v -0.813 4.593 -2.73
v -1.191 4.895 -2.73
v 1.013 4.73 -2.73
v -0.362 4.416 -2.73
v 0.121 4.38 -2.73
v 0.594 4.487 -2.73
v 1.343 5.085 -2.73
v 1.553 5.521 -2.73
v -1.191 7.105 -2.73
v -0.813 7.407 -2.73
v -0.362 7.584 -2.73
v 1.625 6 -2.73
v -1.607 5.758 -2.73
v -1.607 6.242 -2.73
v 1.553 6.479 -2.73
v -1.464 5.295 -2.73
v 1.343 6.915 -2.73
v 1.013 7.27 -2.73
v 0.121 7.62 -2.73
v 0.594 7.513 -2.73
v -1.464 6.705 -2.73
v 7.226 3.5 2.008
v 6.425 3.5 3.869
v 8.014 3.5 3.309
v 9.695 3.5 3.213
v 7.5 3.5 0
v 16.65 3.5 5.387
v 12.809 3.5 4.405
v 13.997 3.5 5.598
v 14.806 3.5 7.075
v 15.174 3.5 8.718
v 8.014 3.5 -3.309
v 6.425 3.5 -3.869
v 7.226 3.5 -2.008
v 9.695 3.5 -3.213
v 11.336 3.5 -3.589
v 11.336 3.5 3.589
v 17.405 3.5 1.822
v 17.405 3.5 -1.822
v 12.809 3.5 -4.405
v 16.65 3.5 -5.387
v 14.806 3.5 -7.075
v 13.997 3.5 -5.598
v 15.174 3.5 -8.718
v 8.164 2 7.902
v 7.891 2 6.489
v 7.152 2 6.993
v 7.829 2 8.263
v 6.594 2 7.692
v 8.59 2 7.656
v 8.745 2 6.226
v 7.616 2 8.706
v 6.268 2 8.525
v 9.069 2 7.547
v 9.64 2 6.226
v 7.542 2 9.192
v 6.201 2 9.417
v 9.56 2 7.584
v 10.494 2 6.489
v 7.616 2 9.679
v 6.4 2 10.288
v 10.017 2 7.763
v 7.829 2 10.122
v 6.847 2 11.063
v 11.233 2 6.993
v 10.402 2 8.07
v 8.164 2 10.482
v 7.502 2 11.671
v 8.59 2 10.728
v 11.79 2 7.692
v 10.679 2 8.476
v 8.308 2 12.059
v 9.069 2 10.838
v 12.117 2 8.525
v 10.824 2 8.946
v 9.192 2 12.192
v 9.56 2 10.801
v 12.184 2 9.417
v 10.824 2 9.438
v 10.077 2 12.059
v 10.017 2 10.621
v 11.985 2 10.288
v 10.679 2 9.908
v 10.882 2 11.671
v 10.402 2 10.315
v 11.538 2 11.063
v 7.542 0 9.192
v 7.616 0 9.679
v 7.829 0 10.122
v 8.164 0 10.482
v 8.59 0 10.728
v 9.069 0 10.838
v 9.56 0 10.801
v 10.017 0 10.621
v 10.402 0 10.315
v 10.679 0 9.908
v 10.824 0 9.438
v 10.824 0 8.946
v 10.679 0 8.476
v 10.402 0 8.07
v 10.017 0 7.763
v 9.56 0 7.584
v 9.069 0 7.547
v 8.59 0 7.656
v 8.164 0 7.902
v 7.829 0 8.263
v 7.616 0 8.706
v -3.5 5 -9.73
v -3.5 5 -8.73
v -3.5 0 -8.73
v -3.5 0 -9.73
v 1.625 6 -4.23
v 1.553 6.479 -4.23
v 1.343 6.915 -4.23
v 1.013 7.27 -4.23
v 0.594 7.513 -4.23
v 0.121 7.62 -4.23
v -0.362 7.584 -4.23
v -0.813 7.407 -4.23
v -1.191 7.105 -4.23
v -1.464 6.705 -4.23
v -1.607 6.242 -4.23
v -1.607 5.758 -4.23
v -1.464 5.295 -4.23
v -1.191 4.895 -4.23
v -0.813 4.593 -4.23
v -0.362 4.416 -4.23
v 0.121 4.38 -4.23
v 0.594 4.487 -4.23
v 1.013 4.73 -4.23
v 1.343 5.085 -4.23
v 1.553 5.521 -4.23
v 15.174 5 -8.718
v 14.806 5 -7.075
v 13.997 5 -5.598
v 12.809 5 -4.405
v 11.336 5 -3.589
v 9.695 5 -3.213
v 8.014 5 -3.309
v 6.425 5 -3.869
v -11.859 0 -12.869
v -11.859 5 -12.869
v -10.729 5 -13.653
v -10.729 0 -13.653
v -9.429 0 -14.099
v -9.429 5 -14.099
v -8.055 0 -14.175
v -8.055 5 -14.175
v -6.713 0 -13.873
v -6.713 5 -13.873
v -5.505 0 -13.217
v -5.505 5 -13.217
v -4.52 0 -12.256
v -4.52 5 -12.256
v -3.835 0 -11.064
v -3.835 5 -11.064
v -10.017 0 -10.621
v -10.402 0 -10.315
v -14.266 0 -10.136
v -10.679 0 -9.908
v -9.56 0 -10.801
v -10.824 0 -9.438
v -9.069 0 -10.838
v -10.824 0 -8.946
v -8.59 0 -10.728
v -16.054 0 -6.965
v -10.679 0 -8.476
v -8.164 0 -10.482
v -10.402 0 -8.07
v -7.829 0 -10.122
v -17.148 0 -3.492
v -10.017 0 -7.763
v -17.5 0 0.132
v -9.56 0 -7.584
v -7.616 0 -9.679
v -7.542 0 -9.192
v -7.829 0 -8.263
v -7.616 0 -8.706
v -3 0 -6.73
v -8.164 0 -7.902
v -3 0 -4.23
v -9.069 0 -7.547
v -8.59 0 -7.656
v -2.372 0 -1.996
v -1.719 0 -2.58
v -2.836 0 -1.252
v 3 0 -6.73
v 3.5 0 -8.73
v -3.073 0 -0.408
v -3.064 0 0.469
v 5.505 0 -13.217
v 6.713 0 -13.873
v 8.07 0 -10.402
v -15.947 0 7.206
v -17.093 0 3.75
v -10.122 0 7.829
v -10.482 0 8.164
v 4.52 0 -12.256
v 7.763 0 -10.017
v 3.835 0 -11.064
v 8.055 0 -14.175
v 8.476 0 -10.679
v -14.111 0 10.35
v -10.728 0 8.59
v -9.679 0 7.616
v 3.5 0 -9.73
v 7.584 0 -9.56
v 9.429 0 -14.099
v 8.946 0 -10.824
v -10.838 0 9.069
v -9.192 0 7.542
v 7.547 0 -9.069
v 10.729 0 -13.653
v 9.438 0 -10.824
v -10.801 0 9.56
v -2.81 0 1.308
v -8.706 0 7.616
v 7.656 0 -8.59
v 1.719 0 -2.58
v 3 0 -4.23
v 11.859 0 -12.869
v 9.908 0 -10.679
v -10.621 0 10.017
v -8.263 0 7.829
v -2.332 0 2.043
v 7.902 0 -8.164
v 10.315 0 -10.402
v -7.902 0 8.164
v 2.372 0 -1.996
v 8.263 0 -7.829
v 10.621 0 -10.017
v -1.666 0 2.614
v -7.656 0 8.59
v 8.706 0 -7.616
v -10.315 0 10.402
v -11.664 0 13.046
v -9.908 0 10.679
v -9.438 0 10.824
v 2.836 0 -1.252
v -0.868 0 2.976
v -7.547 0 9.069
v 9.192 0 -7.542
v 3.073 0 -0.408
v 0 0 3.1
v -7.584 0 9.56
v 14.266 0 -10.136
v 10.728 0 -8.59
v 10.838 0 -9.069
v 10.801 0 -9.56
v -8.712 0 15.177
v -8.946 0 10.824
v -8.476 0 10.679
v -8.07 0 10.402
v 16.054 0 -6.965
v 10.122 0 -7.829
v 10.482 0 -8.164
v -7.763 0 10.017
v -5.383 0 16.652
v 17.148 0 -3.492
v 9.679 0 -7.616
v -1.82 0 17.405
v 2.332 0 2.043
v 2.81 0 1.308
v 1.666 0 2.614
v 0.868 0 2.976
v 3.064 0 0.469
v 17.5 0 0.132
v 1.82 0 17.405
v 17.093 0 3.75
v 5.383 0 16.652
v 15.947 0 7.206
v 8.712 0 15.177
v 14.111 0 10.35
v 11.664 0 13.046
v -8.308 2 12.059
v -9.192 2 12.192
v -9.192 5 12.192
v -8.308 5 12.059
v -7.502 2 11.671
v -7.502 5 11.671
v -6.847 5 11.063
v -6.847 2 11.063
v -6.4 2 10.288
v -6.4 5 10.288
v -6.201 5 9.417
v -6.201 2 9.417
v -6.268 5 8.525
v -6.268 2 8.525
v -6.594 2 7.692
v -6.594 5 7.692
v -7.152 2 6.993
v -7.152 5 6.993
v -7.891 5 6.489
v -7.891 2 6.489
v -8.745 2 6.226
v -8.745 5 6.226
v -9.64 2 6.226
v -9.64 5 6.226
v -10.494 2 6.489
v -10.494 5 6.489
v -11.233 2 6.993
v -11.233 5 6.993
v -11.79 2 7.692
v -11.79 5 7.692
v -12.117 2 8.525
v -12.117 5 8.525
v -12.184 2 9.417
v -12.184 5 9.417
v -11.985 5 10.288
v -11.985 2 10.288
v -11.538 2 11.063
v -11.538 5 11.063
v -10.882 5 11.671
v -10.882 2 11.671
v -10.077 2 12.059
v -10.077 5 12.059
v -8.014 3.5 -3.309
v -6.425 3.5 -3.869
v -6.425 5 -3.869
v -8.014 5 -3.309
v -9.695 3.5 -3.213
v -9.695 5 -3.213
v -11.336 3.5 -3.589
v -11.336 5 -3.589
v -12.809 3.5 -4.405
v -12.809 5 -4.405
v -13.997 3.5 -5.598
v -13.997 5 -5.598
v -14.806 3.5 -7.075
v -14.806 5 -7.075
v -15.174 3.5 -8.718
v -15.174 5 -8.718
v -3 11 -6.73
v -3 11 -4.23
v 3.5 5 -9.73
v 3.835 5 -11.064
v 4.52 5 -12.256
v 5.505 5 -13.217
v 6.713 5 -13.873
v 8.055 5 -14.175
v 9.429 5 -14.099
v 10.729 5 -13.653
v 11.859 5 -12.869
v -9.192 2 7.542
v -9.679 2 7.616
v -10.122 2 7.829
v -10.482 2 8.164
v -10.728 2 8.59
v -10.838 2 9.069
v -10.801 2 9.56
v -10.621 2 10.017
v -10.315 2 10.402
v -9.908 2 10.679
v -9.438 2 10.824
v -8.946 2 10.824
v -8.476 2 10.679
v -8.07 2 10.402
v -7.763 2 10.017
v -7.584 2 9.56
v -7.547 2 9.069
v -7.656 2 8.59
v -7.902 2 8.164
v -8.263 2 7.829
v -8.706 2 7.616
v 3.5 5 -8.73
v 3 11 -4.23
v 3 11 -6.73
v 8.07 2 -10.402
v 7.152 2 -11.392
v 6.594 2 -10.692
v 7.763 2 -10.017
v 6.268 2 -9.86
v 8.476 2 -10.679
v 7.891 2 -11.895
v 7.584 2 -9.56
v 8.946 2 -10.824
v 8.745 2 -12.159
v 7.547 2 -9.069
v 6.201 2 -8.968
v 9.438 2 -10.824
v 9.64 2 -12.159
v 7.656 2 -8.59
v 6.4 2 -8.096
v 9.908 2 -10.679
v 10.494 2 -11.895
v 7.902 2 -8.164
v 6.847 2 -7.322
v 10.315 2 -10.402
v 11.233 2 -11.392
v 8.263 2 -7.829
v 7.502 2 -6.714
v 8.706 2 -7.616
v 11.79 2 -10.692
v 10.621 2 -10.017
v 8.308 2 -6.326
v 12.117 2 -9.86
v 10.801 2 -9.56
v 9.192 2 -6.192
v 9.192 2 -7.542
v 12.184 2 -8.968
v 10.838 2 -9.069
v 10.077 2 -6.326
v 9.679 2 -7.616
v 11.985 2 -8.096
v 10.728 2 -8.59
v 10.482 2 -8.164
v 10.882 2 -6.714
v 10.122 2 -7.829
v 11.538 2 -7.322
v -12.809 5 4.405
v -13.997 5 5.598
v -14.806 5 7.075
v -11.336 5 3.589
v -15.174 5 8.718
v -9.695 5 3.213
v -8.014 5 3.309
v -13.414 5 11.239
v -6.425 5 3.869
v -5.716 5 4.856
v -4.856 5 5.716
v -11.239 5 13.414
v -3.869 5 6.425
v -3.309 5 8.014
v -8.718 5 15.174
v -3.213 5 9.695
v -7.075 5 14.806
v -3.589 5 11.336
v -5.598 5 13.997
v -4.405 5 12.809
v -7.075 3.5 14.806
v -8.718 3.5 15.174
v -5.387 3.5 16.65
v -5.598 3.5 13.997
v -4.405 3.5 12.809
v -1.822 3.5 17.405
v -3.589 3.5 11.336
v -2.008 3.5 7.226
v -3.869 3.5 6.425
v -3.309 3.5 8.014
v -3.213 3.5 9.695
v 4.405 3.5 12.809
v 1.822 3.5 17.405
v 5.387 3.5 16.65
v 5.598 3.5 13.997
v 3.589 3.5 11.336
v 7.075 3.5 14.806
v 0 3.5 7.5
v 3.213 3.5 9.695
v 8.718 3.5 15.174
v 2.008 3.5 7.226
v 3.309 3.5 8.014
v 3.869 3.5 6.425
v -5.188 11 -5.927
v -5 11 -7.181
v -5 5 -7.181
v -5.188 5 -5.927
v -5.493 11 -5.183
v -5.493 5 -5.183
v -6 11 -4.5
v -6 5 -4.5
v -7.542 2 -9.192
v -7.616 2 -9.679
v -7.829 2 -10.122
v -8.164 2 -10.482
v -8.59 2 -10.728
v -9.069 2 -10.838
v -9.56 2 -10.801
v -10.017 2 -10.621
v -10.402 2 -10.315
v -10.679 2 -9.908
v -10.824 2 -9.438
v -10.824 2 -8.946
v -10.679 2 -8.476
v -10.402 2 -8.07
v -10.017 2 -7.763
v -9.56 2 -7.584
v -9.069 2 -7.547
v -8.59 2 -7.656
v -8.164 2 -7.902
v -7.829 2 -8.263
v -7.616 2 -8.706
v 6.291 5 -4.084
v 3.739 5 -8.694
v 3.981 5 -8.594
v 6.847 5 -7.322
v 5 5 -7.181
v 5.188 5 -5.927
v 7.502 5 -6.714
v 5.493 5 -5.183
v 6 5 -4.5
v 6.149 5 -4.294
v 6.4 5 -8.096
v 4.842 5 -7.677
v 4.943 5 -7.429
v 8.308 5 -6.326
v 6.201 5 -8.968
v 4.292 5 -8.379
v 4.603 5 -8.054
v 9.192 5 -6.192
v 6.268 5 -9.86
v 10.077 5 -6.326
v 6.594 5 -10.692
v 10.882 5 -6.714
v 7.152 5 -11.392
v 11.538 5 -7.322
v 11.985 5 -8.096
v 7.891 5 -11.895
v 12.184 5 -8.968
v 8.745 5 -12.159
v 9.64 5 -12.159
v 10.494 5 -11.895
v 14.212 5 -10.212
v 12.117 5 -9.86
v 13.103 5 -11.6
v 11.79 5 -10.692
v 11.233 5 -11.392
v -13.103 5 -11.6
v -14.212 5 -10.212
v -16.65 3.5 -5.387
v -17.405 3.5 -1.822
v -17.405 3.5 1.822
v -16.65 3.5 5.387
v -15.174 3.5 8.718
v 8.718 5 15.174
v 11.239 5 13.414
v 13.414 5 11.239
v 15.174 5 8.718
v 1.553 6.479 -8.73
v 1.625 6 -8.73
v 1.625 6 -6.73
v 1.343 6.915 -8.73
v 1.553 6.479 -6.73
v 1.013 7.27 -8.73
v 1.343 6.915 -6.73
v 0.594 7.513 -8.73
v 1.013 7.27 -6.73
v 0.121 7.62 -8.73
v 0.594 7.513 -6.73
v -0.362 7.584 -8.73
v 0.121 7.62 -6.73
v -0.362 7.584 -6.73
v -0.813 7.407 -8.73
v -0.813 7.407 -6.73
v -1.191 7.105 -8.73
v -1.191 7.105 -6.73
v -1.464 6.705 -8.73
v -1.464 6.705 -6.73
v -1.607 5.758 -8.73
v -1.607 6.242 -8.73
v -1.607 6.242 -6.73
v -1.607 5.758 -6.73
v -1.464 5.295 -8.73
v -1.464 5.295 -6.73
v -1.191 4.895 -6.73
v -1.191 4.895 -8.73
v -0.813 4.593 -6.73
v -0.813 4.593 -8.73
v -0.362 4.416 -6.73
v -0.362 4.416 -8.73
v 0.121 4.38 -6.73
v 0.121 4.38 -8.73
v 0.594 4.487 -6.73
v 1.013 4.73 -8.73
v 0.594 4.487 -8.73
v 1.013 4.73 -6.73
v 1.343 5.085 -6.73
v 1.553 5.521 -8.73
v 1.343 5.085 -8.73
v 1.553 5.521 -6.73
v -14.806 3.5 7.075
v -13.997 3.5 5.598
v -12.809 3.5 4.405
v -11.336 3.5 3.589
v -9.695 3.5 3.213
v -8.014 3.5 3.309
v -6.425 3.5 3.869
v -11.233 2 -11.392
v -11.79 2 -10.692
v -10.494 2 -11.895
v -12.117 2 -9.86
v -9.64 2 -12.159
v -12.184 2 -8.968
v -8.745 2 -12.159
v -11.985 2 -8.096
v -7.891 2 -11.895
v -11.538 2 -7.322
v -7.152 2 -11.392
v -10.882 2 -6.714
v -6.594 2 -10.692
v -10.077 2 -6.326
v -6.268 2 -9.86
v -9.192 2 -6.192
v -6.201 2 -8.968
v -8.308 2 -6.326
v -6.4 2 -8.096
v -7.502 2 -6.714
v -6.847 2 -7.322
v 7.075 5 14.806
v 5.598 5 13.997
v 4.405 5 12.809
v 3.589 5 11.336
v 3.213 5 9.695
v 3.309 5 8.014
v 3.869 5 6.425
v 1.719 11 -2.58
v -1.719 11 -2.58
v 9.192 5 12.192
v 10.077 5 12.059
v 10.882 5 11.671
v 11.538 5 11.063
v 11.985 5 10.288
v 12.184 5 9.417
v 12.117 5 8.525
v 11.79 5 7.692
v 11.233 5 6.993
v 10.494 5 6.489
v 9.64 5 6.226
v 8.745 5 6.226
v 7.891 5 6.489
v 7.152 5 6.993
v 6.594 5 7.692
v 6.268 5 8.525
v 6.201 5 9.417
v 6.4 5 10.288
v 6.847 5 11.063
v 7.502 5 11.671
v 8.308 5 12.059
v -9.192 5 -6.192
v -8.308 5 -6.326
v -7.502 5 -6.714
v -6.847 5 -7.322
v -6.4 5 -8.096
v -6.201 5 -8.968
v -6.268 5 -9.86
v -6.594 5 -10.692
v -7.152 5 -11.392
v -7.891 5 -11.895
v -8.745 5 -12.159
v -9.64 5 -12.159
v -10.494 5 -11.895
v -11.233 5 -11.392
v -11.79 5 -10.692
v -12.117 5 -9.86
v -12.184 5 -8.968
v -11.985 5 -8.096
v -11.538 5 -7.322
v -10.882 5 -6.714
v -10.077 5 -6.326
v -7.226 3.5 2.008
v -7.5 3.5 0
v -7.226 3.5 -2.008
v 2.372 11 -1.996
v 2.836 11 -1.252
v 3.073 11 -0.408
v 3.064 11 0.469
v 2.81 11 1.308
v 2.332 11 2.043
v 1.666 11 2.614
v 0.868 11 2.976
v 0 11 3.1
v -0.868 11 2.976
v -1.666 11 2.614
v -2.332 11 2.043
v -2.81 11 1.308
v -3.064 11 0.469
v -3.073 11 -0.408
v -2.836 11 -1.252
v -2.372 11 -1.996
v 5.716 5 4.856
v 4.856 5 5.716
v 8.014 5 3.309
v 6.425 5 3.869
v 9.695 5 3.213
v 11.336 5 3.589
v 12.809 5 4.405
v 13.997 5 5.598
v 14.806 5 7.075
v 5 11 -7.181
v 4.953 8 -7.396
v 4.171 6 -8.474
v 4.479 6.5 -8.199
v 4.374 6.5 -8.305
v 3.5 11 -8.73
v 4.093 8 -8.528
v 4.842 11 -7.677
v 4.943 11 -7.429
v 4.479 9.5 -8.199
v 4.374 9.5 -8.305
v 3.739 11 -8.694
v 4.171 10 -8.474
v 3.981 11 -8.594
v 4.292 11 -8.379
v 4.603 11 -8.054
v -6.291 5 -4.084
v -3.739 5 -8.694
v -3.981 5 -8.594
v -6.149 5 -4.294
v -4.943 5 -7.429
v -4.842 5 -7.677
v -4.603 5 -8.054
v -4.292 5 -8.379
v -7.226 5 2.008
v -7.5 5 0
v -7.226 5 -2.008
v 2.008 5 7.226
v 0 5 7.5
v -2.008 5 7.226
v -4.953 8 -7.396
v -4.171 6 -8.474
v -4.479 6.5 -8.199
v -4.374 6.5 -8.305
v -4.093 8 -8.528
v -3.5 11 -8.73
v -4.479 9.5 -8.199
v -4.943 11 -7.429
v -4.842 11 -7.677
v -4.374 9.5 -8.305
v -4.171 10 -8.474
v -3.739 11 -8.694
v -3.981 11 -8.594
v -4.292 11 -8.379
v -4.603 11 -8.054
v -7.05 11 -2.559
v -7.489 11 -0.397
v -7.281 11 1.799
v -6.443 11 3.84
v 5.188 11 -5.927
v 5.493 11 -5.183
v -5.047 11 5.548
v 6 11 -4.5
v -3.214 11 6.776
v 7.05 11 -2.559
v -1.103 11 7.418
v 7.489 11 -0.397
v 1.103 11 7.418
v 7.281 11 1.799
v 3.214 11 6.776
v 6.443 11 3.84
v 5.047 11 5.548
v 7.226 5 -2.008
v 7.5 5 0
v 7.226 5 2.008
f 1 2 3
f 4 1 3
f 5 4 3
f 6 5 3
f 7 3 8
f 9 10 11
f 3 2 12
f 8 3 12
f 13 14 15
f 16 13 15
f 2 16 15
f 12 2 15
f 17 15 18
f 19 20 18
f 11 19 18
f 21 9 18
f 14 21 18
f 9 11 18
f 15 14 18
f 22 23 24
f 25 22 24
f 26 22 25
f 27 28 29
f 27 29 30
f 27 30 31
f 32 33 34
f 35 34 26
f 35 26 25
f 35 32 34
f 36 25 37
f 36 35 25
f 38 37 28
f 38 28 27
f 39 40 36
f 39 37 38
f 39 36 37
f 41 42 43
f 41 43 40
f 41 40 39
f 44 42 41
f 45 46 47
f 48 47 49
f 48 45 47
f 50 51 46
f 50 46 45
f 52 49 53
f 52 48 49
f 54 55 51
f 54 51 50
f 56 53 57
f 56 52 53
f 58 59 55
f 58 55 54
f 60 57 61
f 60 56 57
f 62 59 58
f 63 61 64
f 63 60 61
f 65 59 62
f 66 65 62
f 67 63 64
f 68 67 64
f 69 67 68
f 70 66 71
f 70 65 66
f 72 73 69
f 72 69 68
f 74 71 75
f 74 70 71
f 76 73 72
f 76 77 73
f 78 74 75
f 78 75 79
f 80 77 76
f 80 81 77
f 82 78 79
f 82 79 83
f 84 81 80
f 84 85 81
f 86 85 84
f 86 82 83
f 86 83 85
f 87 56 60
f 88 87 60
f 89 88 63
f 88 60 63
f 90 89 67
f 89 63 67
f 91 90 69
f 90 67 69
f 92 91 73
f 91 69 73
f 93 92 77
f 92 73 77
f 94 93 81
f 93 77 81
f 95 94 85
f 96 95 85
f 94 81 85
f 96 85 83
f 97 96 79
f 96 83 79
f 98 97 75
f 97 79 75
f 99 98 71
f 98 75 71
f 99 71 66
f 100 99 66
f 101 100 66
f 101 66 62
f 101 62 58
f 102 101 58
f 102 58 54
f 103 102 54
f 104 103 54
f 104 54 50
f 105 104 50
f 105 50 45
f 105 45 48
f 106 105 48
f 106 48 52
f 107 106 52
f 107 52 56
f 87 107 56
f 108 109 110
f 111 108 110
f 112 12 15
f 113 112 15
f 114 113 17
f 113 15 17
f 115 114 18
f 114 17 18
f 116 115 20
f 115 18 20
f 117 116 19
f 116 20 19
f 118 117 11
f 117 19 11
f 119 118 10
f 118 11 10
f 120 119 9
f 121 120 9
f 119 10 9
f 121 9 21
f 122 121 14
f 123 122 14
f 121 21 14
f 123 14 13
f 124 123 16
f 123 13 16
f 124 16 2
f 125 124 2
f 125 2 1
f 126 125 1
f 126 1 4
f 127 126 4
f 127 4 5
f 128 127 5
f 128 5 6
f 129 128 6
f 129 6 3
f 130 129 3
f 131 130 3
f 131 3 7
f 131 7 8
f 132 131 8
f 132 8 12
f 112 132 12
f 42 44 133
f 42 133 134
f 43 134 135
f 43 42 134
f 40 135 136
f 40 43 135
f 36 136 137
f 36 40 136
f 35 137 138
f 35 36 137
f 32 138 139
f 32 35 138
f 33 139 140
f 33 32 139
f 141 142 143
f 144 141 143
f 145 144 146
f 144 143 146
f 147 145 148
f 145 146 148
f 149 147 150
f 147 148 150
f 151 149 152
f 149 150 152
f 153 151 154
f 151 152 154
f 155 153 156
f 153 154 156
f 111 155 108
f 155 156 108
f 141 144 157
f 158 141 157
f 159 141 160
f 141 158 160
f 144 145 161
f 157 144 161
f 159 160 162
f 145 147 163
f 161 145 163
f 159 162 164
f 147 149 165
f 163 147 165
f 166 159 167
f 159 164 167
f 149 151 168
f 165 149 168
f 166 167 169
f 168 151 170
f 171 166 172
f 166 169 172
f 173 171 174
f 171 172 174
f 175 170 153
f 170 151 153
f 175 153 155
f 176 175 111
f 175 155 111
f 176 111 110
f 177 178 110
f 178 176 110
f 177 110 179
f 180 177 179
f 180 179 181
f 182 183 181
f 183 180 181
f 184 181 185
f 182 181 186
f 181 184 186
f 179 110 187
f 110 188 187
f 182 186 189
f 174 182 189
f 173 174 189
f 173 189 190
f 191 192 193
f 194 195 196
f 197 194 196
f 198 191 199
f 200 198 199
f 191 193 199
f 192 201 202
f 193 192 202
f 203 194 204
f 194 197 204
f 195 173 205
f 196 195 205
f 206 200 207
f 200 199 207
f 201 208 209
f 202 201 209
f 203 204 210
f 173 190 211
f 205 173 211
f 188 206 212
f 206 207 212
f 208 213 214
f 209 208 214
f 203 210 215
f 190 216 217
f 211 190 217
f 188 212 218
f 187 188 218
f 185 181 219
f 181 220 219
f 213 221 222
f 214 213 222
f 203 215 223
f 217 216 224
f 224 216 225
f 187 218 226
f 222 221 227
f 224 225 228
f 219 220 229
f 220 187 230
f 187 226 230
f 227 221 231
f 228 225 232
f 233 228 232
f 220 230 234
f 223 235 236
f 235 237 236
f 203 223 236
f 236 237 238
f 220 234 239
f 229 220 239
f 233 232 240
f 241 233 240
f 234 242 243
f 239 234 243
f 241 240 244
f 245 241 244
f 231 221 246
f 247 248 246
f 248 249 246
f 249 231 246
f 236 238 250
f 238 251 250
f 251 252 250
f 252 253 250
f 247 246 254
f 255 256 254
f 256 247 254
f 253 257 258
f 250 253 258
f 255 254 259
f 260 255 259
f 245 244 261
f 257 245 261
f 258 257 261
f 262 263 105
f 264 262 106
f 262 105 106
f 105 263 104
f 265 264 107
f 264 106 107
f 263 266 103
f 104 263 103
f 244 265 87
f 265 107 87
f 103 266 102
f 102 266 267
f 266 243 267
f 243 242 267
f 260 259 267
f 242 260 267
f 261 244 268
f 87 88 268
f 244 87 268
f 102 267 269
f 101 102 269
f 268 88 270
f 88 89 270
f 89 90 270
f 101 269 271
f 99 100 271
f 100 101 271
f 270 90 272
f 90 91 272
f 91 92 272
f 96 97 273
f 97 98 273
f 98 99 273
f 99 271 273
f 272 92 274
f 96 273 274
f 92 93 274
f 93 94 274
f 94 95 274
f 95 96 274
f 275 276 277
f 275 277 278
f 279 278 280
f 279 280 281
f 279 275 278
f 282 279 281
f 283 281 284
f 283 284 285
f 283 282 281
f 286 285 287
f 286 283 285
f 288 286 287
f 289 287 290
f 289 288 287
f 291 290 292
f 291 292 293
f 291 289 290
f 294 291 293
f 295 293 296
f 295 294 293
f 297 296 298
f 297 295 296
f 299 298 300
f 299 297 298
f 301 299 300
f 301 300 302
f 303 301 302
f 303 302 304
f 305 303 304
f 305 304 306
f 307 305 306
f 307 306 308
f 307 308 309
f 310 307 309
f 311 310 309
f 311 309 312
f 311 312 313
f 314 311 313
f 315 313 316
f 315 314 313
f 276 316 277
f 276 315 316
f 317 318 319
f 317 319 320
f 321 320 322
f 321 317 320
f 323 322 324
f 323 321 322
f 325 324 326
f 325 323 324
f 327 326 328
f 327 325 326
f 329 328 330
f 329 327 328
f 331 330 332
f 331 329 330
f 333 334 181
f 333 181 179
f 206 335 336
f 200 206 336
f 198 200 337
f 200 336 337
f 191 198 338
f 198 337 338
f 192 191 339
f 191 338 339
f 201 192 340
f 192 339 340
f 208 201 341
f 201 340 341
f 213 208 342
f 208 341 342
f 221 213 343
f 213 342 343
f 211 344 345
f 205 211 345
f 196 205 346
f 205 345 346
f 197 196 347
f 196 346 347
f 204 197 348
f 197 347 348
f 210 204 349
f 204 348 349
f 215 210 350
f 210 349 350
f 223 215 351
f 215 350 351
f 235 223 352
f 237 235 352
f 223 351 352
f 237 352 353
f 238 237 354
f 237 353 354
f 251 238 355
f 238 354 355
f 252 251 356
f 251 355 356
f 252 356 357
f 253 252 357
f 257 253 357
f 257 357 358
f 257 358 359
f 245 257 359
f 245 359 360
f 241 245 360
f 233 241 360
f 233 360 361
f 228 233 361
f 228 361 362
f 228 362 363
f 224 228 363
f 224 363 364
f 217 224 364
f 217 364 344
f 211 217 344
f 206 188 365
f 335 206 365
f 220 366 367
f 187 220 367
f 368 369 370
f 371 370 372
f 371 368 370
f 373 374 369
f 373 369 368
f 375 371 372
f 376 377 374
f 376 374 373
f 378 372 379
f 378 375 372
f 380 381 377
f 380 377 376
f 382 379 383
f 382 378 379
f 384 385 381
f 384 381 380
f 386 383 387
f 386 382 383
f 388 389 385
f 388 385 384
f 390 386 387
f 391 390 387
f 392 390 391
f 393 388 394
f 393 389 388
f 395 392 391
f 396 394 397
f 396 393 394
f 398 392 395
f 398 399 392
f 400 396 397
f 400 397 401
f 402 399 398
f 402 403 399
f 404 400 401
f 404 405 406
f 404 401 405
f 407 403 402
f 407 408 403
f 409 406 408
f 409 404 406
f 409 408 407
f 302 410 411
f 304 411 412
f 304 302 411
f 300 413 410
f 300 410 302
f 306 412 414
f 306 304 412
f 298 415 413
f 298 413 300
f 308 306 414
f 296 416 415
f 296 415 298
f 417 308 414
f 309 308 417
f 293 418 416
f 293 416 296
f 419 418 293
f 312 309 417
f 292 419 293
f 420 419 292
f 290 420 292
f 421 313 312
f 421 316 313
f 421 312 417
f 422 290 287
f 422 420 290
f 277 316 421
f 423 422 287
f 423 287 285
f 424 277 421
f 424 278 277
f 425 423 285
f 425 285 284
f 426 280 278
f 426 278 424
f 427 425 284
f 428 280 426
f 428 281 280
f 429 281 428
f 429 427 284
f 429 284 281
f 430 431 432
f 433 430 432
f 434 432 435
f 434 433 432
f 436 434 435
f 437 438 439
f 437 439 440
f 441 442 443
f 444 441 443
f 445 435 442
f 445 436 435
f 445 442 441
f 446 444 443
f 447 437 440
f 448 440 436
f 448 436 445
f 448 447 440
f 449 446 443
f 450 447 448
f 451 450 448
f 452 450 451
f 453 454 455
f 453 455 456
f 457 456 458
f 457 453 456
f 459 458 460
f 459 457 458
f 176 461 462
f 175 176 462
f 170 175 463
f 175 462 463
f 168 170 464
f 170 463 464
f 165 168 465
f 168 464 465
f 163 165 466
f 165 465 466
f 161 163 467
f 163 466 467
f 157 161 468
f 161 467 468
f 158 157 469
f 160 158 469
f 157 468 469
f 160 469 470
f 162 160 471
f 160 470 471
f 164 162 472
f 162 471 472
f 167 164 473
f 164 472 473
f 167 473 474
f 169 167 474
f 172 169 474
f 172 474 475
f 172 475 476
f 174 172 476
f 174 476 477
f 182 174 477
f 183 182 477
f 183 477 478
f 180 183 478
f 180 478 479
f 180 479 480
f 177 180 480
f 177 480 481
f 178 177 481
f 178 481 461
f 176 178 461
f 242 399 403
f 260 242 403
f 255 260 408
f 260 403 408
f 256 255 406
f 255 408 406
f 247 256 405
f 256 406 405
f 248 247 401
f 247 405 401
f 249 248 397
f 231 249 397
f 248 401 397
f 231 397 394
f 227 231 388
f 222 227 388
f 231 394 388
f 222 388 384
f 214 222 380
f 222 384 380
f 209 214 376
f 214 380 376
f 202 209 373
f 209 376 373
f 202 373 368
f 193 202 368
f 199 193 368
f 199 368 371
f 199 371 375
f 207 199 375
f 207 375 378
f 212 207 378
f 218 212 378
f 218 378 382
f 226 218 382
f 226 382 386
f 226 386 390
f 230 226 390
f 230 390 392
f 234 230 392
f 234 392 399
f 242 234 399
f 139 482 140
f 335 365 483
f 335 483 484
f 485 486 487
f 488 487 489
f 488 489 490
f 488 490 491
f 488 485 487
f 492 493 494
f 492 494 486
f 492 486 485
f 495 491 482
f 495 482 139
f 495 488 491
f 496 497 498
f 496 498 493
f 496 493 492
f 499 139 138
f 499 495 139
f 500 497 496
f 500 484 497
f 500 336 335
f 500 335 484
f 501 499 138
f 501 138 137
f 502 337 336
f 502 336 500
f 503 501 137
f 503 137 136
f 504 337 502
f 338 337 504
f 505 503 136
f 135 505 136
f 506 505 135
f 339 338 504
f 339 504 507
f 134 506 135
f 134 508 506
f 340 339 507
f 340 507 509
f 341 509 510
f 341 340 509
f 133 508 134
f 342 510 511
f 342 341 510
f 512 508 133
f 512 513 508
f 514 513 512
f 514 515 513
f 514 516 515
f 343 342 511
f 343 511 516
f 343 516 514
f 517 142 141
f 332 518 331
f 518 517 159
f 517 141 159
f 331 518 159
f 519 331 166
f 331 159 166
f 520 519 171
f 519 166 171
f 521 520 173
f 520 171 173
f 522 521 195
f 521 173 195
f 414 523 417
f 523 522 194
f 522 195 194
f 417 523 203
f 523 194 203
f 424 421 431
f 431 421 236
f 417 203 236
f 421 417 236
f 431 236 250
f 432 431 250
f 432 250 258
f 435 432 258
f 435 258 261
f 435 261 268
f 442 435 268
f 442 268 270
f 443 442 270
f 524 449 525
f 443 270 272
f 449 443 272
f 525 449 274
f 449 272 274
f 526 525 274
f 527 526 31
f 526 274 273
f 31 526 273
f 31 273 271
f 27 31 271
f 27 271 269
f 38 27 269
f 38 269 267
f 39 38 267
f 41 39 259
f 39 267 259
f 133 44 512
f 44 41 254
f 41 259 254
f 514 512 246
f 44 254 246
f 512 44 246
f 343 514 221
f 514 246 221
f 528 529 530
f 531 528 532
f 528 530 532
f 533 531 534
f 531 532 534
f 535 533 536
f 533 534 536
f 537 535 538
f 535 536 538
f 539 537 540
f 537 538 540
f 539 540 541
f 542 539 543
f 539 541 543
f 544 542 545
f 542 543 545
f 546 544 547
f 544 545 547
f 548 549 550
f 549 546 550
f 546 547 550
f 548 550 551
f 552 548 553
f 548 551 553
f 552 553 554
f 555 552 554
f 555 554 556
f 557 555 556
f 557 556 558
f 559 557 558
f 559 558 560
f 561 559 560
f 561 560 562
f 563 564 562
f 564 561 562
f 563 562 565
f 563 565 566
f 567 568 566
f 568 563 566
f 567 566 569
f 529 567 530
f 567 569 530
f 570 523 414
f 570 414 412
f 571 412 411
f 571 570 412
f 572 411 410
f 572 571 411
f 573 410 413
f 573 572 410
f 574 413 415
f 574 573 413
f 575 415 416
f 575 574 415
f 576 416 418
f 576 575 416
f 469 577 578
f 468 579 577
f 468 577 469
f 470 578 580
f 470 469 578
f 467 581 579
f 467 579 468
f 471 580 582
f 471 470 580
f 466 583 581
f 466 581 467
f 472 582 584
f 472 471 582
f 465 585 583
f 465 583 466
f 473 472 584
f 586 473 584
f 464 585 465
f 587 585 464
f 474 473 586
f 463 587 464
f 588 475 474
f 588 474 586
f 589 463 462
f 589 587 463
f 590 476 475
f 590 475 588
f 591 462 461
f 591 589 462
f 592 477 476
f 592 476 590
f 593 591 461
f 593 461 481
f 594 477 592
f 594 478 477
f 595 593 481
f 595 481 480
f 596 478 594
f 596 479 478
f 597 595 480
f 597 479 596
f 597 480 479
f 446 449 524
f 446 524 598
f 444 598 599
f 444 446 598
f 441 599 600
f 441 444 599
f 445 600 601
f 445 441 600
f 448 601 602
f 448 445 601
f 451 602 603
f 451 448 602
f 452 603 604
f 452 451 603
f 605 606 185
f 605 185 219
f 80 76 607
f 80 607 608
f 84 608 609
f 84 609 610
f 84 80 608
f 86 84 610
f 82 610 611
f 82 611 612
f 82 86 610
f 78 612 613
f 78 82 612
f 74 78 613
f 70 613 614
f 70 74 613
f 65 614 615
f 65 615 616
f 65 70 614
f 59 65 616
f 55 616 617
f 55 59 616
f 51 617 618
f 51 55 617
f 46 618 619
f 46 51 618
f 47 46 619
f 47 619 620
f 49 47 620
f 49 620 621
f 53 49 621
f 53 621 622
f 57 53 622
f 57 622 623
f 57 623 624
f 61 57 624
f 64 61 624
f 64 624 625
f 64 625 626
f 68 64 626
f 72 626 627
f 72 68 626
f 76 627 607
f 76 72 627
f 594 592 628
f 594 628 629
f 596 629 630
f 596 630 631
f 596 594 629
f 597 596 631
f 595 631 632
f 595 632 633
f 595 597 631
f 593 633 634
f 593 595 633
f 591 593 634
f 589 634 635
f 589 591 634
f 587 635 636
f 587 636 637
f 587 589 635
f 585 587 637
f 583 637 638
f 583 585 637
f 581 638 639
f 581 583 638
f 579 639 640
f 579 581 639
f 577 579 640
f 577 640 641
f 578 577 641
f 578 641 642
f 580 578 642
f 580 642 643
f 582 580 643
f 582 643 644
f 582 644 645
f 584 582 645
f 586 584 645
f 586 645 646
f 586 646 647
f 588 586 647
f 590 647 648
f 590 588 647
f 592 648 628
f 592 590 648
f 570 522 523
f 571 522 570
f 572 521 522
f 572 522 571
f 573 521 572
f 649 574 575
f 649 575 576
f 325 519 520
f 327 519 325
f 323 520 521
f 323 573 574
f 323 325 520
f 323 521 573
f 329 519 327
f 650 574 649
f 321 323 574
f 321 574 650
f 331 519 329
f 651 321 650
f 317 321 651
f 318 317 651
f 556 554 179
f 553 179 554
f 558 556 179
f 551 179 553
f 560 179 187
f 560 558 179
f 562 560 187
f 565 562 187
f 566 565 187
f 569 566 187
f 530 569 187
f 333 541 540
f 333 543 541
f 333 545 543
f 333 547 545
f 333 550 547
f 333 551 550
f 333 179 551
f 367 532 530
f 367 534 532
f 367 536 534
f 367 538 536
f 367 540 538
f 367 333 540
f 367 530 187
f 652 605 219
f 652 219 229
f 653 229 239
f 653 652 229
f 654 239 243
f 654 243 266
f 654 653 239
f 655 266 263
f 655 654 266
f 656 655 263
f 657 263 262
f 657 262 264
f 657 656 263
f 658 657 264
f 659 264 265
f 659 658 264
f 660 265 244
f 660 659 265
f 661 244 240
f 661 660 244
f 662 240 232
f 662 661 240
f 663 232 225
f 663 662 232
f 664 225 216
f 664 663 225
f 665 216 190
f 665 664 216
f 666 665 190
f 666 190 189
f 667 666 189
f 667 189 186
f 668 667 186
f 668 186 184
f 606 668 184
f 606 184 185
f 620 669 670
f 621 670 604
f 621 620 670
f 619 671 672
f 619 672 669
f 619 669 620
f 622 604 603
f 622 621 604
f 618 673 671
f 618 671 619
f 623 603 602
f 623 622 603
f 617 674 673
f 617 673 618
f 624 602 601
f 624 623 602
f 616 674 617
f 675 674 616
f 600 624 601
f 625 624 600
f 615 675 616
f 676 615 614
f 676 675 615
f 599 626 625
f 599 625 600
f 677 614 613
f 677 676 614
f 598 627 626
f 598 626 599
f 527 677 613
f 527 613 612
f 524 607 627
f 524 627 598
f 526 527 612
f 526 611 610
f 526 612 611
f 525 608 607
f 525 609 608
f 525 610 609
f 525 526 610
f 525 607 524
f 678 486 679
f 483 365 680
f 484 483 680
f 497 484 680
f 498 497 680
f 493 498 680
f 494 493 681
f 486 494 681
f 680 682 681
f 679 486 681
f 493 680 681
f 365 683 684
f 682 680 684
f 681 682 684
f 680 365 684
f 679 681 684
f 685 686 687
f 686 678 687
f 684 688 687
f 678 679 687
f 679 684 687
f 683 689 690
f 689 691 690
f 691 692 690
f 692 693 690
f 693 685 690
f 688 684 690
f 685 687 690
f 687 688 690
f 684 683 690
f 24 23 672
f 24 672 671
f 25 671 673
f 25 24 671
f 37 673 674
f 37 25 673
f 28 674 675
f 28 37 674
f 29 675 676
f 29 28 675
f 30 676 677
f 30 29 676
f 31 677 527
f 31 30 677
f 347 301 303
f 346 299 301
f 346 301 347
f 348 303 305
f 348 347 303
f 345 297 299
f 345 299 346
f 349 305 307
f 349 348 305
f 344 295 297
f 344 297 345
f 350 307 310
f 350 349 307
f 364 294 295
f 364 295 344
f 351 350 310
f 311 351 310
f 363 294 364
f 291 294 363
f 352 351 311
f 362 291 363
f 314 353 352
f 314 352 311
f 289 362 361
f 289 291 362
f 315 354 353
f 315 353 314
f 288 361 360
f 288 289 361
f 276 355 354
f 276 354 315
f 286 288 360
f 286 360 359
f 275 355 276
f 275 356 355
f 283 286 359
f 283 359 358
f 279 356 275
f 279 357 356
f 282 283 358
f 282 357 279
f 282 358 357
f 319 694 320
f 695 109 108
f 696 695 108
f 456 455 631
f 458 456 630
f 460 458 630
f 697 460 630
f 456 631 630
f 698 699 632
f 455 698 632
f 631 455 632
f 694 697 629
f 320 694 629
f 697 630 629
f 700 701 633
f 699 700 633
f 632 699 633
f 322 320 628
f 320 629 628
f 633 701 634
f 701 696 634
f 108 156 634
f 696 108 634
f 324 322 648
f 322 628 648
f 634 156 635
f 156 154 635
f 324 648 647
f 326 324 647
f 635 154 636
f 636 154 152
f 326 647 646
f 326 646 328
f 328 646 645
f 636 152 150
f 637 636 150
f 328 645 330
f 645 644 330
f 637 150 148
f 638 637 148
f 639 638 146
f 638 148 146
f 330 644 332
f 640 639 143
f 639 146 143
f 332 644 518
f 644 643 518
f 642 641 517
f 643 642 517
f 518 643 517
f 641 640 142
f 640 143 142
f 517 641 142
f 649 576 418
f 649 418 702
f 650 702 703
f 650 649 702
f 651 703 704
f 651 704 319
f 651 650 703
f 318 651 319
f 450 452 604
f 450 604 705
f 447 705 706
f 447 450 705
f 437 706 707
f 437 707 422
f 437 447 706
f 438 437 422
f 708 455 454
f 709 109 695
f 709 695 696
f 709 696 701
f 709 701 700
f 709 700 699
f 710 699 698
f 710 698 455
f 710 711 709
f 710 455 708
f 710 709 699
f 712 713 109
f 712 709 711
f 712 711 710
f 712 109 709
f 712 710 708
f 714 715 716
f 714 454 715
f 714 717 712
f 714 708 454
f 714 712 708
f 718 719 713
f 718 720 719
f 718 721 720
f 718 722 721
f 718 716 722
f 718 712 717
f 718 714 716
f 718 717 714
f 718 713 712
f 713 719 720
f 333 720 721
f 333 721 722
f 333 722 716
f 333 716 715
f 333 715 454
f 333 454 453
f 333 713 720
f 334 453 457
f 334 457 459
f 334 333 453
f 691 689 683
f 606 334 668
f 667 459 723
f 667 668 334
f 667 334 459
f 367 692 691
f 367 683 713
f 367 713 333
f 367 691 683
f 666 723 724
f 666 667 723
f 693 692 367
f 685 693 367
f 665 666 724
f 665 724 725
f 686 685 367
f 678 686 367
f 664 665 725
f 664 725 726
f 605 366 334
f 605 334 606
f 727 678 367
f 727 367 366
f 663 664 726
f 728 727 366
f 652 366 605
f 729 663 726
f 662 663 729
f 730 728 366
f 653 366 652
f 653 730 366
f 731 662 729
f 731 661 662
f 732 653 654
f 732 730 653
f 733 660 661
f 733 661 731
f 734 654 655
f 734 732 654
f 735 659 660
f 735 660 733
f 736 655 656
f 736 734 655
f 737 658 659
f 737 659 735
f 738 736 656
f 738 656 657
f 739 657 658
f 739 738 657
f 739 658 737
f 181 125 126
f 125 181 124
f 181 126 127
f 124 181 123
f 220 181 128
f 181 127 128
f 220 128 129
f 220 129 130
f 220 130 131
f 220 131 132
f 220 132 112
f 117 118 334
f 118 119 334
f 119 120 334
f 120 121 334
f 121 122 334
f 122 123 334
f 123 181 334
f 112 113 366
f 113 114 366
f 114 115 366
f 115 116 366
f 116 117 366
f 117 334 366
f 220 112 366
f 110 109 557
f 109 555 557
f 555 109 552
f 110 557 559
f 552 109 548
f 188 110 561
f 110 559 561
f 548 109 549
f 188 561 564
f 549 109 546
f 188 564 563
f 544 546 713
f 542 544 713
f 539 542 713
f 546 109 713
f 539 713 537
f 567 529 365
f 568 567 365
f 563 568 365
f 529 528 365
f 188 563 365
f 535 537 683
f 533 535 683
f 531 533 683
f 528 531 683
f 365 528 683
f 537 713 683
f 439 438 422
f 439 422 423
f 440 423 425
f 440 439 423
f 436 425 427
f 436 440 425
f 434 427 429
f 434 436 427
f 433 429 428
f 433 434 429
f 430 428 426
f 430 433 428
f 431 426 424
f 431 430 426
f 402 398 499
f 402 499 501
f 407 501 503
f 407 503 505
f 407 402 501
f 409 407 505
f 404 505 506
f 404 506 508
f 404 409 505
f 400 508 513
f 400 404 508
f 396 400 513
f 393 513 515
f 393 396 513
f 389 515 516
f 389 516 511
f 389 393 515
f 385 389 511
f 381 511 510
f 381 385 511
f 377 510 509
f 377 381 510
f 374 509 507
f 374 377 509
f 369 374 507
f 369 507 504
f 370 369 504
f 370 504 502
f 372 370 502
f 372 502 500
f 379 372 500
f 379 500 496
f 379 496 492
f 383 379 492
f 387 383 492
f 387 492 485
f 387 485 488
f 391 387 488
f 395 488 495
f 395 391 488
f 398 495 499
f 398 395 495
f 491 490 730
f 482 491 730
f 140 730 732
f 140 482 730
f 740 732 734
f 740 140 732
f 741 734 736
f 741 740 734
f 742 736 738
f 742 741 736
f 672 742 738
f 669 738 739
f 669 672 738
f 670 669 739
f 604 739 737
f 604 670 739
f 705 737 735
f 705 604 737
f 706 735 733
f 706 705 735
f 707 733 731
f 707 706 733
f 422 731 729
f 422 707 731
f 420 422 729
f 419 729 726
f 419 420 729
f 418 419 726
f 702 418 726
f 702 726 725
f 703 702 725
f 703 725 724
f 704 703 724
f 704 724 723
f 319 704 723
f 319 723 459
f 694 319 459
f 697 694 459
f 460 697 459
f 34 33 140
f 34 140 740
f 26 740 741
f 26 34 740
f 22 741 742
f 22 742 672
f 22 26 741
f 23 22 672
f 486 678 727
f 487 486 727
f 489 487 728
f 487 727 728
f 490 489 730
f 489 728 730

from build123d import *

# Parameters (mm, degrees)
SKETCH_1_R               = 17.5
EXTRUDE_1_DEPTH          = 2
SKETCH_2_R               = 8.75
EXTRUDE_2_DEPTH          = 9
CUT_EXTRUDE_START        = -2
CUT_EXTRUDE_8_DEPTH      = 2
SKETCH_9_R               = 1.65
CUT_EXTRUDE_7_DEPTH      = 27.334388165
PATTERN_CIRCULAR_2_COUNT = 4
SKETCH_10_R              = 17.5
SKETCH_10_R_2            = 8.75
SKETCH_10_R_3            = 3
EXTRUDE_3_DEPTH          = 3
SKETCH_14_W              = 7
SKETCH_14_H              = 5
CUT_EXTRUDE_9_DEPTH      = 34.411263071
SKETCH_3_R               = 1.625
CUT_EXTRUDE_1_DEPTH      = 29.922359862
SKETCH_4_W               = 6
SKETCH_4_H               = 2.5
CUT_EXTRUDE_2_DEPTH      = 28.083205128
SKETCH_11_R              = 1.625
EXTRUDE_4_DEPTH          = 3
FILLET_2_R               = 5
CUT_EXTRUDE_START_2      = -6
CUT_EXTRUDE_11_DEPTH     = 6
CUT_EXTRUDE_START_3      = -1.5
CUT_EXTRUDE_12_DEPTH     = 1.5
EXTRUDE_5_DEPTH          = 11
CUT_EXTRUDE_START_4      = -1
SKETCH_19_R              = 1.625
CUT_EXTRUDE_13_DEPTH     = 1
CUT_EXTRUDE_15_DEPTH     = 6


with BuildPart() as part:
    # Эскиз1 → Бобышка-Вытянуть1 (new body)
    with BuildSketch(Plane(origin=(0, 0, 0), x_dir=(1, 0, 0), z_dir=(0, 1, 0))):
        with Locations(Location((0, 0, 0), (0, 0, 270))):
            Circle(SKETCH_1_R)
    extrude(amount=EXTRUDE_1_DEPTH)

    # Эскиз2 → Бобышка-Вытянуть2 (add)
    with BuildSketch(Plane(origin=(0, 2, 0), x_dir=(1, 0, 0), z_dir=(0, 1, 0))):
        with Locations(Location((0, 0, 0), (0, 0, 270))):
            Circle(SKETCH_2_R)
        with BuildLine():
            Line((-1.763405796, 2.73), (1.763405796, 2.73))
            ThreePointArc((1.763405796, 2.73), (0, -3.25), (-1.763405796, 2.73))
        make_face(mode=Mode.SUBTRACT)
    extrude(amount=EXTRUDE_2_DEPTH)

    # Эскиз12 → Вырез-Вытянуть8 (cut)
    with BuildSketch(Plane(origin=(0, 2, 0), x_dir=(1, 0, 0), z_dir=(0, 1, 0)).offset(CUT_EXTRUDE_START)):
        with BuildLine():
            Line((-1.763405796, 2.73), (1.763405796, 2.73))
            ThreePointArc((1.763405796, 2.73), (0, -3.25), (-1.763405796, 2.73))
        make_face()
    extrude(amount=CUT_EXTRUDE_8_DEPTH, mode=Mode.SUBTRACT)

    # Эскиз9 → Вырез-Вытянуть7 (cut, through all)
    with BuildSketch(Plane(origin=(0, 2, 0), x_dir=(1, 0, 0), z_dir=(0, 1, 0))):
        with Locations(Location((9.192388155, 9.192388155, 0), (0, 0, 270))):
            Circle(SKETCH_9_R)
    cut_extrude_7 = extrude(amount=-CUT_EXTRUDE_7_DEPTH, mode=Mode.SUBTRACT)

    # Круговой массив2: Вырез-Вытянуть7 ×4 about axis
    pattern_circular_2_axis = Axis((0, 0, 0), (0, 1, 0))
    for i in range(1, PATTERN_CIRCULAR_2_COUNT):
        add(cut_extrude_7.rotate(pattern_circular_2_axis, i * 360 / PATTERN_CIRCULAR_2_COUNT), mode=Mode.SUBTRACT)

    # Эскиз10 → Бобышка-Вытянуть3 (add)
    with BuildSketch(Plane(origin=(0, 2, 0), x_dir=(1, 0, 0), z_dir=(0, 1, 0))):
        with Locations(Location((0, 0, 0), (0, 0, 270))):
            Circle(SKETCH_10_R)
        with Locations(Location((0, 0, 0), (0, 0, 270))):
            Circle(SKETCH_10_R_2, mode=Mode.SUBTRACT)
        with Locations(Location((-9.192388155, 9.192388155, 0), (0, 0, 270))):
            Circle(SKETCH_10_R_3, mode=Mode.SUBTRACT)
        with Locations(Location((9.192388155, 9.192388155, 0), (0, 0, 270))):
            Circle(SKETCH_10_R_3, mode=Mode.SUBTRACT)
        with Locations(Location((9.192388155, -9.192388155, 0), (0, 0, 270))):
            Circle(SKETCH_10_R_3, mode=Mode.SUBTRACT)
        with Locations(Location((-9.192388155, -9.192388155, 0), (0, 0, 270))):
            Circle(SKETCH_10_R_3, mode=Mode.SUBTRACT)
    extrude(amount=EXTRUDE_3_DEPTH)

    # Эскиз14 → Вырез-Вытянуть9 (cut, through all)
    with BuildSketch(Plane(origin=(0, 0, -8.75), x_dir=(-1, 0, 0), z_dir=(0, 0, -1))):
        with Locations((0, 2.5)):
            Rectangle(SKETCH_14_W, SKETCH_14_H)
    extrude(amount=CUT_EXTRUDE_9_DEPTH, mode=Mode.SUBTRACT)

    # Эскиз3 → Вырез-Вытянуть1 (cut, through all)
    with BuildSketch(Plane.XY.offset(-2.73)):
        with Locations((0, 6)):
            Circle(SKETCH_3_R)
    extrude(amount=-CUT_EXTRUDE_1_DEPTH, mode=Mode.SUBTRACT)

    # Эскиз4 → Вырез-Вытянуть2 (cut, through all)
    with BuildSketch(Plane(origin=(0, 11, 0), x_dir=(1, 0, 0), z_dir=(0, 1, 0))):
        with Locations((0, 5.48)):
            Rectangle(SKETCH_4_W, SKETCH_4_H)
    extrude(amount=-CUT_EXTRUDE_2_DEPTH, mode=Mode.SUBTRACT)

    # Эскиз11 → Бобышка-Вытянуть4 (add)
    with BuildSketch(Plane.XY.offset(-6.73)):
        Polygon((5, 1), (3.5, 1), (3.5, 0), (-3.5, 0), (-3.5, 1), (-5, 1), (-5, 11), (5, 11), align=None)
        with Locations((0, 6)):
            Circle(SKETCH_11_R, mode=Mode.SUBTRACT)
    extrude(amount=-EXTRUDE_4_DEPTH)

    # Скругление2
    # the kernel refuses this fillet: 5 mm, written as the material it takes off along each edge
    with BuildSketch(Plane(origin=(3.5, 28.475665973, -17.146428199), x_dir=(0.8902152374524571, 0, 0.4555401530133928), z_dir=(0, -1, 0))) as fillet_2_piece_1:
        with BuildLine():
            CenterArc((8.048799762, 4.816686339), FILLET_2_R, 159.077415517, 126.48531946)
            Line((3.378480837, 6.602217391), (3.285074458, 6.637928012))
            ThreePointArc((3.285074458, 6.637928012), (1.600218895, 3.346662711), (-0.089021524, 0.045554015))
            Line((-0.089021524, 0.045554015), (-0.026829333, -0.096333727))
            ThreePointArc((-0.026829333, -0.096333727), (4.695133195, -0.741597813), (9.417095722, -0.096333727))
            Line((9.417095722, -0.096333727), (9.390266389, 0))
        make_face()
    extrude(amount=51.951331945, mode=Mode.SUBTRACT)
    with BuildSketch(Plane(origin=(-3.5, 28.475665973, -17.146428199), x_dir=(-0.8902152374524572, 0, 0.4555401530133924), z_dir=(0, -1, 0))) as fillet_2_piece_2:
        with BuildLine():
            CenterArc((8.048799762, -4.816686339), FILLET_2_R, 74.437265023, 126.48531946)
            Line((3.378480837, -6.602217391), (3.285074458, -6.637928012))
            ThreePointArc((3.285074458, -6.637928012), (1.600218895, -3.346662711), (-0.089021524, -0.045554015))
            Line((-0.089021524, -0.045554015), (-0.026829333, 0.096333727))
            ThreePointArc((-0.026829333, 0.096333727), (4.695133195, 0.741597813), (9.417095722, 0.096333727))
            Line((9.417095722, 0.096333727), (9.390266389, 0))
        make_face()
    extrude(amount=51.951331945, mode=Mode.SUBTRACT)

    # Эскиз16 → Вырез-Вытянуть11 (cut)
    with BuildSketch(Plane(origin=(0, 11, 0), x_dir=(1, 0, 0), z_dir=(0, 1, 0)).offset(CUT_EXTRUDE_START_2)):
        with BuildLine():
            Line((-6, 4.5), (-5, 7.180703308))
            ThreePointArc((-5, 7.180703308), (0, -8.75), (5, 7.180703308))
            Line((5, 7.180703308), (6, 4.5))
            ThreePointArc((6, 4.5), (0, -7.5), (-6, 4.5))
        make_face()
    extrude(amount=CUT_EXTRUDE_11_DEPTH, mode=Mode.SUBTRACT)

    # Эскиз17 → Вырез-Вытянуть12 (cut)
    with BuildSketch(Plane(origin=(0, 5, 0), x_dir=(1, 0, 0), z_dir=(0, 1, 0)).offset(CUT_EXTRUDE_START_3)):
        with BuildLine():
            ThreePointArc((-15.17363778, 8.718412499), (-17.5, 0), (-15.17363778, -8.718412499))
            ThreePointArc((-15.17363778, -8.718412499), (-12.101500502, -3.944811061), (-6.425279536, -3.868563413))
            ThreePointArc((-6.425279536, -3.868563413), (-7.5, 0), (-6.425279536, 3.868563413))
            ThreePointArc((-6.425279536, 3.868563413), (-12.101500502, 3.944811061), (-15.17363778, 8.718412499))
        make_face()
        with BuildLine():
            ThreePointArc((-8.718412499, -15.17363778), (0, -17.5), (8.718412499, -15.17363778))
            ThreePointArc((8.718412499, -15.17363778), (3.944811061, -12.101500502), (3.868563413, -6.425279536))
            ThreePointArc((3.868563413, -6.425279536), (0, -7.5), (-3.868563413, -6.425279536))
            ThreePointArc((-3.868563413, -6.425279536), (-3.944811061, -12.101500502), (-8.718412499, -15.17363778))
        make_face()
        with BuildLine():
            ThreePointArc((15.17363778, -8.718412499), (17.5, 0), (15.17363778, 8.718412499))
            ThreePointArc((15.17363778, 8.718412499), (12.101500502, 3.944811061), (6.425279536, 3.868563413))
            ThreePointArc((6.425279536, 3.868563413), (7.5, 0), (6.425279536, -3.868563413))
            ThreePointArc((6.425279536, -3.868563413), (12.101500502, -3.944811061), (15.17363778, -8.718412499))
        make_face()
    extrude(amount=CUT_EXTRUDE_12_DEPTH, mode=Mode.SUBTRACT)

    # Эскиз18 → Бобышка-Вытянуть5 (add, through all)
    with BuildSketch(Plane(origin=(0, 11, 0), x_dir=(1, 0, 0), z_dir=(0, 1, 0))):
        with BuildLine():
            Line((-1.763405796, 2.73), (1.763405796, 2.73))
            ThreePointArc((1.763405796, 2.73), (0, -3.25), (-1.763405796, 2.73))
        make_face()
        with BuildLine():
            Line((-1.718604085, 2.58), (1.718604085, 2.58))
            ThreePointArc((1.718604085, 2.58), (0, -3.1), (-1.718604085, 2.58))
        make_face(mode=Mode.SUBTRACT)
    extrude(amount=-EXTRUDE_5_DEPTH)

    # Эскиз19 → Вырез-Вытянуть13 (cut)
    with BuildSketch(Plane(origin=(0, 0, -9.73), x_dir=(-1, 0, 0), z_dir=(0, 0, -1)).offset(CUT_EXTRUDE_START_4)):
        Polygon((-5, 11), (5, 11), (5, 5), (3.5, 5), (3.5, 0), (-3.5, 0), (-3.5, 5), (-5, 5), align=None)
        with Locations(Location((0, 6, 0), (0, 0, 180))):
            Circle(SKETCH_19_R, mode=Mode.SUBTRACT)
    extrude(amount=CUT_EXTRUDE_13_DEPTH, mode=Mode.SUBTRACT)

    # Эскиз20 → Вырез-Вытянуть15 (cut)
    with BuildSketch(Plane(origin=(0, 11, 0), x_dir=(1, 0, 0), z_dir=(0, 1, 0))):
        with BuildLine():
            add(Edge.make_bspline(
                [(-3.5, 8.73), (-4.079656123, 8.73), (-4.842651299, 7.966190202), (-4.988696176, 7.252329412), (-5, 7.180703308)],
                knots=[0, 0, 0, 0, 0.430033256, 0.477814729, 0.477814729, 0.477814729, 0.477814729], degree=3))
            Line((-3.5, 8.73), (-5, 8.73))
            Line((-5, 8.73), (-5, 7.180703308))
        make_face()
        with BuildLine():
            add(Edge.make_bspline(
                [(-5, 7.180703308), (-5.012353513, 7.102425904), (-5.096467294, 6.31678513), (-5.16082419, 5.405951438), (-6, 4.5)],
                knots=[0.477814729, 0.477814729, 0.477814729, 0.477814729, 0.530033256, 1, 1, 1, 1], degree=3))
            Line((-5, 7.180703308), (-6, 4.5))
        make_face()
        with BuildLine():
            Line((5, 8.73), (3.5, 8.73))
            add(Edge.make_bspline(
                [(3.5, 8.73), (4.079656123, 8.73), (4.842651299, 7.966190202), (4.988696176, 7.252329412), (5, 7.180703308)],
                knots=[0, 0, 0, 0, 0.430033256, 0.477814729, 0.477814729, 0.477814729, 0.477814729], degree=3))
            Line((5, 7.180703308), (5, 8.73))
        make_face()
        with BuildLine():
            Line((6, 4.5), (5, 7.180703308))
            add(Edge.make_bspline(
                [(5, 7.180703308), (5.012353513, 7.102425904), (5.096467294, 6.31678513), (5.16082419, 5.405951438), (6, 4.5)],
                knots=[0.477814729, 0.477814729, 0.477814729, 0.477814729, 0.530033256, 1, 1, 1, 1], degree=3))
        make_face()
    extrude(amount=-CUT_EXTRUDE_15_DEPTH, mode=Mode.SUBTRACT)


solid = part.part
